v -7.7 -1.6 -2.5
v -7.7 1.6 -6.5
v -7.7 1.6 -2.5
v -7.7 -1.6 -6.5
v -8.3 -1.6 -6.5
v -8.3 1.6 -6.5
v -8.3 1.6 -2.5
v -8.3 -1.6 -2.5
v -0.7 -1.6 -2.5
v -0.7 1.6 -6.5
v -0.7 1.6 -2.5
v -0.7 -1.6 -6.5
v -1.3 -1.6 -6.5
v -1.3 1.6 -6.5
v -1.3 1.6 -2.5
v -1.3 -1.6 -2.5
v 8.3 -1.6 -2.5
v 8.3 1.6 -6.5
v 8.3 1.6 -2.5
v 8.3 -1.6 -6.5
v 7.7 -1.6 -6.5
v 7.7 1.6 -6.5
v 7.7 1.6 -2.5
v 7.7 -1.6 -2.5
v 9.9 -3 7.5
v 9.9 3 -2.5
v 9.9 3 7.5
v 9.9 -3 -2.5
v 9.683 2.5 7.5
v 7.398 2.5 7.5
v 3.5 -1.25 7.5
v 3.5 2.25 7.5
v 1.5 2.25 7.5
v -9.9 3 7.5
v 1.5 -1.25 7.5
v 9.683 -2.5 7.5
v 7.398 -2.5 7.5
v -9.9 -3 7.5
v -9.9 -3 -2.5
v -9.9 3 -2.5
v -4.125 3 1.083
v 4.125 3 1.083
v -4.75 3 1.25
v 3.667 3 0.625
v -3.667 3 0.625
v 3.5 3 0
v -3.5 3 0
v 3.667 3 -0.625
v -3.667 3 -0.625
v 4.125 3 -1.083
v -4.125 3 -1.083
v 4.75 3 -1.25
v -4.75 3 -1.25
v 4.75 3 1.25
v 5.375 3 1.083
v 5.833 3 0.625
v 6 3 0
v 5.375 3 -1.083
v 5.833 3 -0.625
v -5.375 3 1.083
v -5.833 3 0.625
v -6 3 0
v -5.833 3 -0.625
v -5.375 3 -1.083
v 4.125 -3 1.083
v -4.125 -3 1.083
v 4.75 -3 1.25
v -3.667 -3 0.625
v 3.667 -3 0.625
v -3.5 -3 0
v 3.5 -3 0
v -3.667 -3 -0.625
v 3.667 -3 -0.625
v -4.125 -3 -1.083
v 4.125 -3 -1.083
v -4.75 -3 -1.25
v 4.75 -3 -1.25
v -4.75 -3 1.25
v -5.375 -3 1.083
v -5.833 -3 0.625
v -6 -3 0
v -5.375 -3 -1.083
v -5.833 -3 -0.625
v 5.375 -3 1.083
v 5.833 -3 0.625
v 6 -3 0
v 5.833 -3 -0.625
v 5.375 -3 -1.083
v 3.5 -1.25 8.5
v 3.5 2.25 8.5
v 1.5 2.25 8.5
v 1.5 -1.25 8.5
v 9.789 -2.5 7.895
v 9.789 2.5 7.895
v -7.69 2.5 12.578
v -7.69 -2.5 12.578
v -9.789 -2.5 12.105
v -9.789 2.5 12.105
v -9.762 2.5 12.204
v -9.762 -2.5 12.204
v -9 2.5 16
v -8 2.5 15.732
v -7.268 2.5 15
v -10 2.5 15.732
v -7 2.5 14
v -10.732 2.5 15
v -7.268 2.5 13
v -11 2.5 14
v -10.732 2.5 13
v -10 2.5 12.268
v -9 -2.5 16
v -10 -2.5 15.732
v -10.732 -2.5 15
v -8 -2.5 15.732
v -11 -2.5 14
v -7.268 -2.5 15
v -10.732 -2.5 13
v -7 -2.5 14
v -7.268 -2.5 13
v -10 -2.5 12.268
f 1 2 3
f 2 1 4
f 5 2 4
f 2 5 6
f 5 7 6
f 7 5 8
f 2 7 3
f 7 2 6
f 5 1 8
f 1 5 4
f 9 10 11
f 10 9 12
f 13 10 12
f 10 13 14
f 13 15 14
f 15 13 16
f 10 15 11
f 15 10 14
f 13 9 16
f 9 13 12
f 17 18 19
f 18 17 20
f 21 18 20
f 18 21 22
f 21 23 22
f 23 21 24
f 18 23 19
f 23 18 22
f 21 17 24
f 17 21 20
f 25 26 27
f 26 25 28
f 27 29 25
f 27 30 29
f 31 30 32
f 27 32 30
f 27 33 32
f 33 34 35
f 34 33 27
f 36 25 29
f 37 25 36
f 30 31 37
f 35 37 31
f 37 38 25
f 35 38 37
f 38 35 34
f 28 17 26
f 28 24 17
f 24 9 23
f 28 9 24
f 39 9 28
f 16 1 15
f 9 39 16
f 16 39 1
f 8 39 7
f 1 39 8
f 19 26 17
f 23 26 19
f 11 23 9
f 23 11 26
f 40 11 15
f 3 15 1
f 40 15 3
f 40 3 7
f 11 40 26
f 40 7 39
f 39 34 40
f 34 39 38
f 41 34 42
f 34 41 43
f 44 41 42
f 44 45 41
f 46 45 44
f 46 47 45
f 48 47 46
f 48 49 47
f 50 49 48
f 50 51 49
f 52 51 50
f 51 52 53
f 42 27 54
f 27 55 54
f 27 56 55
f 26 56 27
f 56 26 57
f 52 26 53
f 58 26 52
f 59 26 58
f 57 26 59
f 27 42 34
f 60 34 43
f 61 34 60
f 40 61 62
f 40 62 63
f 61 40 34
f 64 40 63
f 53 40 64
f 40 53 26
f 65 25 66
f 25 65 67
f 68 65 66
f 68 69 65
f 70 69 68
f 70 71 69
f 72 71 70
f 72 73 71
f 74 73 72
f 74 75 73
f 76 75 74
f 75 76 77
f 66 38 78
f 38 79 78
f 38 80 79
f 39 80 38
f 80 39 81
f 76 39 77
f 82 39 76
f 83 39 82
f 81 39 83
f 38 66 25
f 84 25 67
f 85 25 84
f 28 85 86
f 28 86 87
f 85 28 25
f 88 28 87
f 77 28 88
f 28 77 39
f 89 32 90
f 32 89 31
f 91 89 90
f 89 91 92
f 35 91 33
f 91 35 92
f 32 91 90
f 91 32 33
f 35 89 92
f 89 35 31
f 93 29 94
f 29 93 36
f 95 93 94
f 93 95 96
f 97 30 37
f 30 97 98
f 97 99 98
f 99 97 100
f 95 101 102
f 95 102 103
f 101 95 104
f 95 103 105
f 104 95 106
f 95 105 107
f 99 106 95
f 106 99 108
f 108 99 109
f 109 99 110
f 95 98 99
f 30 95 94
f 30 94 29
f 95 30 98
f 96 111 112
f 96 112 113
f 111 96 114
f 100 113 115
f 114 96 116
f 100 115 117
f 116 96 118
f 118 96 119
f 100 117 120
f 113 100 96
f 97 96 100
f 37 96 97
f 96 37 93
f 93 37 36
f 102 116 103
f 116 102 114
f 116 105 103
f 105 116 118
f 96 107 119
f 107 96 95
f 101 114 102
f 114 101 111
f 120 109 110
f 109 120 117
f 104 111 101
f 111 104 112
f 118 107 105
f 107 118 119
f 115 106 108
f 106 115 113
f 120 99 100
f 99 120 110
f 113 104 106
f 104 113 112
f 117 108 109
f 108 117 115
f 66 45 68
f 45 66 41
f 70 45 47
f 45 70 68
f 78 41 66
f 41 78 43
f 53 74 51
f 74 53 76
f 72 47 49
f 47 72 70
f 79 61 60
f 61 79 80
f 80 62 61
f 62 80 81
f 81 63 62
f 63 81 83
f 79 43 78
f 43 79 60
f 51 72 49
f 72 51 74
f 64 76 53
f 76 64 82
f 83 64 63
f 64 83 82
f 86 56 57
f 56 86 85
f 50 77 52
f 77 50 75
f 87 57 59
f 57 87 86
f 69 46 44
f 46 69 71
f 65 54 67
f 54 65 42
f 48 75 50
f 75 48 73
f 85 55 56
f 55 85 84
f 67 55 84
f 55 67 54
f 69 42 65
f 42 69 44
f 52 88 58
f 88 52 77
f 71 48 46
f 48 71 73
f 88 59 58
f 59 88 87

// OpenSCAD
// Don't print this file, purchase real micro switches
// e.g. Honeywell ZM10B10A01 or OMRON SS-5 or similar.

module microswitch() {
  difference() {
    union() {
      translate([0, 0, 2.5])
        cube([19.8, 6, 10], center=true);
      translate([2.5, 0.5, 6])
        cube([2, 3.5, 5], center=true);
      translate([0, 0, 10]) rotate([0,15,0])
				cube([20,5,1], center=true);
			translate([-9, 0, 14]) rotate([90,0,0])
	      cylinder(r=2, h=5, center=true, $fn=12);
      for (x = [-8, -1, 8]) {
        translate([x, 0, 0])
          cube([0.6, 3.2, 13], center=true);
      }
    }
    for (x = [-9.5/2, 9.5/2]) {
      translate([x, 0, 0]) rotate([90, 0, 0])
        cylinder(r=2.5/2, h=20, center=true, $fn=12);
    }
  }
}

microswitch();
